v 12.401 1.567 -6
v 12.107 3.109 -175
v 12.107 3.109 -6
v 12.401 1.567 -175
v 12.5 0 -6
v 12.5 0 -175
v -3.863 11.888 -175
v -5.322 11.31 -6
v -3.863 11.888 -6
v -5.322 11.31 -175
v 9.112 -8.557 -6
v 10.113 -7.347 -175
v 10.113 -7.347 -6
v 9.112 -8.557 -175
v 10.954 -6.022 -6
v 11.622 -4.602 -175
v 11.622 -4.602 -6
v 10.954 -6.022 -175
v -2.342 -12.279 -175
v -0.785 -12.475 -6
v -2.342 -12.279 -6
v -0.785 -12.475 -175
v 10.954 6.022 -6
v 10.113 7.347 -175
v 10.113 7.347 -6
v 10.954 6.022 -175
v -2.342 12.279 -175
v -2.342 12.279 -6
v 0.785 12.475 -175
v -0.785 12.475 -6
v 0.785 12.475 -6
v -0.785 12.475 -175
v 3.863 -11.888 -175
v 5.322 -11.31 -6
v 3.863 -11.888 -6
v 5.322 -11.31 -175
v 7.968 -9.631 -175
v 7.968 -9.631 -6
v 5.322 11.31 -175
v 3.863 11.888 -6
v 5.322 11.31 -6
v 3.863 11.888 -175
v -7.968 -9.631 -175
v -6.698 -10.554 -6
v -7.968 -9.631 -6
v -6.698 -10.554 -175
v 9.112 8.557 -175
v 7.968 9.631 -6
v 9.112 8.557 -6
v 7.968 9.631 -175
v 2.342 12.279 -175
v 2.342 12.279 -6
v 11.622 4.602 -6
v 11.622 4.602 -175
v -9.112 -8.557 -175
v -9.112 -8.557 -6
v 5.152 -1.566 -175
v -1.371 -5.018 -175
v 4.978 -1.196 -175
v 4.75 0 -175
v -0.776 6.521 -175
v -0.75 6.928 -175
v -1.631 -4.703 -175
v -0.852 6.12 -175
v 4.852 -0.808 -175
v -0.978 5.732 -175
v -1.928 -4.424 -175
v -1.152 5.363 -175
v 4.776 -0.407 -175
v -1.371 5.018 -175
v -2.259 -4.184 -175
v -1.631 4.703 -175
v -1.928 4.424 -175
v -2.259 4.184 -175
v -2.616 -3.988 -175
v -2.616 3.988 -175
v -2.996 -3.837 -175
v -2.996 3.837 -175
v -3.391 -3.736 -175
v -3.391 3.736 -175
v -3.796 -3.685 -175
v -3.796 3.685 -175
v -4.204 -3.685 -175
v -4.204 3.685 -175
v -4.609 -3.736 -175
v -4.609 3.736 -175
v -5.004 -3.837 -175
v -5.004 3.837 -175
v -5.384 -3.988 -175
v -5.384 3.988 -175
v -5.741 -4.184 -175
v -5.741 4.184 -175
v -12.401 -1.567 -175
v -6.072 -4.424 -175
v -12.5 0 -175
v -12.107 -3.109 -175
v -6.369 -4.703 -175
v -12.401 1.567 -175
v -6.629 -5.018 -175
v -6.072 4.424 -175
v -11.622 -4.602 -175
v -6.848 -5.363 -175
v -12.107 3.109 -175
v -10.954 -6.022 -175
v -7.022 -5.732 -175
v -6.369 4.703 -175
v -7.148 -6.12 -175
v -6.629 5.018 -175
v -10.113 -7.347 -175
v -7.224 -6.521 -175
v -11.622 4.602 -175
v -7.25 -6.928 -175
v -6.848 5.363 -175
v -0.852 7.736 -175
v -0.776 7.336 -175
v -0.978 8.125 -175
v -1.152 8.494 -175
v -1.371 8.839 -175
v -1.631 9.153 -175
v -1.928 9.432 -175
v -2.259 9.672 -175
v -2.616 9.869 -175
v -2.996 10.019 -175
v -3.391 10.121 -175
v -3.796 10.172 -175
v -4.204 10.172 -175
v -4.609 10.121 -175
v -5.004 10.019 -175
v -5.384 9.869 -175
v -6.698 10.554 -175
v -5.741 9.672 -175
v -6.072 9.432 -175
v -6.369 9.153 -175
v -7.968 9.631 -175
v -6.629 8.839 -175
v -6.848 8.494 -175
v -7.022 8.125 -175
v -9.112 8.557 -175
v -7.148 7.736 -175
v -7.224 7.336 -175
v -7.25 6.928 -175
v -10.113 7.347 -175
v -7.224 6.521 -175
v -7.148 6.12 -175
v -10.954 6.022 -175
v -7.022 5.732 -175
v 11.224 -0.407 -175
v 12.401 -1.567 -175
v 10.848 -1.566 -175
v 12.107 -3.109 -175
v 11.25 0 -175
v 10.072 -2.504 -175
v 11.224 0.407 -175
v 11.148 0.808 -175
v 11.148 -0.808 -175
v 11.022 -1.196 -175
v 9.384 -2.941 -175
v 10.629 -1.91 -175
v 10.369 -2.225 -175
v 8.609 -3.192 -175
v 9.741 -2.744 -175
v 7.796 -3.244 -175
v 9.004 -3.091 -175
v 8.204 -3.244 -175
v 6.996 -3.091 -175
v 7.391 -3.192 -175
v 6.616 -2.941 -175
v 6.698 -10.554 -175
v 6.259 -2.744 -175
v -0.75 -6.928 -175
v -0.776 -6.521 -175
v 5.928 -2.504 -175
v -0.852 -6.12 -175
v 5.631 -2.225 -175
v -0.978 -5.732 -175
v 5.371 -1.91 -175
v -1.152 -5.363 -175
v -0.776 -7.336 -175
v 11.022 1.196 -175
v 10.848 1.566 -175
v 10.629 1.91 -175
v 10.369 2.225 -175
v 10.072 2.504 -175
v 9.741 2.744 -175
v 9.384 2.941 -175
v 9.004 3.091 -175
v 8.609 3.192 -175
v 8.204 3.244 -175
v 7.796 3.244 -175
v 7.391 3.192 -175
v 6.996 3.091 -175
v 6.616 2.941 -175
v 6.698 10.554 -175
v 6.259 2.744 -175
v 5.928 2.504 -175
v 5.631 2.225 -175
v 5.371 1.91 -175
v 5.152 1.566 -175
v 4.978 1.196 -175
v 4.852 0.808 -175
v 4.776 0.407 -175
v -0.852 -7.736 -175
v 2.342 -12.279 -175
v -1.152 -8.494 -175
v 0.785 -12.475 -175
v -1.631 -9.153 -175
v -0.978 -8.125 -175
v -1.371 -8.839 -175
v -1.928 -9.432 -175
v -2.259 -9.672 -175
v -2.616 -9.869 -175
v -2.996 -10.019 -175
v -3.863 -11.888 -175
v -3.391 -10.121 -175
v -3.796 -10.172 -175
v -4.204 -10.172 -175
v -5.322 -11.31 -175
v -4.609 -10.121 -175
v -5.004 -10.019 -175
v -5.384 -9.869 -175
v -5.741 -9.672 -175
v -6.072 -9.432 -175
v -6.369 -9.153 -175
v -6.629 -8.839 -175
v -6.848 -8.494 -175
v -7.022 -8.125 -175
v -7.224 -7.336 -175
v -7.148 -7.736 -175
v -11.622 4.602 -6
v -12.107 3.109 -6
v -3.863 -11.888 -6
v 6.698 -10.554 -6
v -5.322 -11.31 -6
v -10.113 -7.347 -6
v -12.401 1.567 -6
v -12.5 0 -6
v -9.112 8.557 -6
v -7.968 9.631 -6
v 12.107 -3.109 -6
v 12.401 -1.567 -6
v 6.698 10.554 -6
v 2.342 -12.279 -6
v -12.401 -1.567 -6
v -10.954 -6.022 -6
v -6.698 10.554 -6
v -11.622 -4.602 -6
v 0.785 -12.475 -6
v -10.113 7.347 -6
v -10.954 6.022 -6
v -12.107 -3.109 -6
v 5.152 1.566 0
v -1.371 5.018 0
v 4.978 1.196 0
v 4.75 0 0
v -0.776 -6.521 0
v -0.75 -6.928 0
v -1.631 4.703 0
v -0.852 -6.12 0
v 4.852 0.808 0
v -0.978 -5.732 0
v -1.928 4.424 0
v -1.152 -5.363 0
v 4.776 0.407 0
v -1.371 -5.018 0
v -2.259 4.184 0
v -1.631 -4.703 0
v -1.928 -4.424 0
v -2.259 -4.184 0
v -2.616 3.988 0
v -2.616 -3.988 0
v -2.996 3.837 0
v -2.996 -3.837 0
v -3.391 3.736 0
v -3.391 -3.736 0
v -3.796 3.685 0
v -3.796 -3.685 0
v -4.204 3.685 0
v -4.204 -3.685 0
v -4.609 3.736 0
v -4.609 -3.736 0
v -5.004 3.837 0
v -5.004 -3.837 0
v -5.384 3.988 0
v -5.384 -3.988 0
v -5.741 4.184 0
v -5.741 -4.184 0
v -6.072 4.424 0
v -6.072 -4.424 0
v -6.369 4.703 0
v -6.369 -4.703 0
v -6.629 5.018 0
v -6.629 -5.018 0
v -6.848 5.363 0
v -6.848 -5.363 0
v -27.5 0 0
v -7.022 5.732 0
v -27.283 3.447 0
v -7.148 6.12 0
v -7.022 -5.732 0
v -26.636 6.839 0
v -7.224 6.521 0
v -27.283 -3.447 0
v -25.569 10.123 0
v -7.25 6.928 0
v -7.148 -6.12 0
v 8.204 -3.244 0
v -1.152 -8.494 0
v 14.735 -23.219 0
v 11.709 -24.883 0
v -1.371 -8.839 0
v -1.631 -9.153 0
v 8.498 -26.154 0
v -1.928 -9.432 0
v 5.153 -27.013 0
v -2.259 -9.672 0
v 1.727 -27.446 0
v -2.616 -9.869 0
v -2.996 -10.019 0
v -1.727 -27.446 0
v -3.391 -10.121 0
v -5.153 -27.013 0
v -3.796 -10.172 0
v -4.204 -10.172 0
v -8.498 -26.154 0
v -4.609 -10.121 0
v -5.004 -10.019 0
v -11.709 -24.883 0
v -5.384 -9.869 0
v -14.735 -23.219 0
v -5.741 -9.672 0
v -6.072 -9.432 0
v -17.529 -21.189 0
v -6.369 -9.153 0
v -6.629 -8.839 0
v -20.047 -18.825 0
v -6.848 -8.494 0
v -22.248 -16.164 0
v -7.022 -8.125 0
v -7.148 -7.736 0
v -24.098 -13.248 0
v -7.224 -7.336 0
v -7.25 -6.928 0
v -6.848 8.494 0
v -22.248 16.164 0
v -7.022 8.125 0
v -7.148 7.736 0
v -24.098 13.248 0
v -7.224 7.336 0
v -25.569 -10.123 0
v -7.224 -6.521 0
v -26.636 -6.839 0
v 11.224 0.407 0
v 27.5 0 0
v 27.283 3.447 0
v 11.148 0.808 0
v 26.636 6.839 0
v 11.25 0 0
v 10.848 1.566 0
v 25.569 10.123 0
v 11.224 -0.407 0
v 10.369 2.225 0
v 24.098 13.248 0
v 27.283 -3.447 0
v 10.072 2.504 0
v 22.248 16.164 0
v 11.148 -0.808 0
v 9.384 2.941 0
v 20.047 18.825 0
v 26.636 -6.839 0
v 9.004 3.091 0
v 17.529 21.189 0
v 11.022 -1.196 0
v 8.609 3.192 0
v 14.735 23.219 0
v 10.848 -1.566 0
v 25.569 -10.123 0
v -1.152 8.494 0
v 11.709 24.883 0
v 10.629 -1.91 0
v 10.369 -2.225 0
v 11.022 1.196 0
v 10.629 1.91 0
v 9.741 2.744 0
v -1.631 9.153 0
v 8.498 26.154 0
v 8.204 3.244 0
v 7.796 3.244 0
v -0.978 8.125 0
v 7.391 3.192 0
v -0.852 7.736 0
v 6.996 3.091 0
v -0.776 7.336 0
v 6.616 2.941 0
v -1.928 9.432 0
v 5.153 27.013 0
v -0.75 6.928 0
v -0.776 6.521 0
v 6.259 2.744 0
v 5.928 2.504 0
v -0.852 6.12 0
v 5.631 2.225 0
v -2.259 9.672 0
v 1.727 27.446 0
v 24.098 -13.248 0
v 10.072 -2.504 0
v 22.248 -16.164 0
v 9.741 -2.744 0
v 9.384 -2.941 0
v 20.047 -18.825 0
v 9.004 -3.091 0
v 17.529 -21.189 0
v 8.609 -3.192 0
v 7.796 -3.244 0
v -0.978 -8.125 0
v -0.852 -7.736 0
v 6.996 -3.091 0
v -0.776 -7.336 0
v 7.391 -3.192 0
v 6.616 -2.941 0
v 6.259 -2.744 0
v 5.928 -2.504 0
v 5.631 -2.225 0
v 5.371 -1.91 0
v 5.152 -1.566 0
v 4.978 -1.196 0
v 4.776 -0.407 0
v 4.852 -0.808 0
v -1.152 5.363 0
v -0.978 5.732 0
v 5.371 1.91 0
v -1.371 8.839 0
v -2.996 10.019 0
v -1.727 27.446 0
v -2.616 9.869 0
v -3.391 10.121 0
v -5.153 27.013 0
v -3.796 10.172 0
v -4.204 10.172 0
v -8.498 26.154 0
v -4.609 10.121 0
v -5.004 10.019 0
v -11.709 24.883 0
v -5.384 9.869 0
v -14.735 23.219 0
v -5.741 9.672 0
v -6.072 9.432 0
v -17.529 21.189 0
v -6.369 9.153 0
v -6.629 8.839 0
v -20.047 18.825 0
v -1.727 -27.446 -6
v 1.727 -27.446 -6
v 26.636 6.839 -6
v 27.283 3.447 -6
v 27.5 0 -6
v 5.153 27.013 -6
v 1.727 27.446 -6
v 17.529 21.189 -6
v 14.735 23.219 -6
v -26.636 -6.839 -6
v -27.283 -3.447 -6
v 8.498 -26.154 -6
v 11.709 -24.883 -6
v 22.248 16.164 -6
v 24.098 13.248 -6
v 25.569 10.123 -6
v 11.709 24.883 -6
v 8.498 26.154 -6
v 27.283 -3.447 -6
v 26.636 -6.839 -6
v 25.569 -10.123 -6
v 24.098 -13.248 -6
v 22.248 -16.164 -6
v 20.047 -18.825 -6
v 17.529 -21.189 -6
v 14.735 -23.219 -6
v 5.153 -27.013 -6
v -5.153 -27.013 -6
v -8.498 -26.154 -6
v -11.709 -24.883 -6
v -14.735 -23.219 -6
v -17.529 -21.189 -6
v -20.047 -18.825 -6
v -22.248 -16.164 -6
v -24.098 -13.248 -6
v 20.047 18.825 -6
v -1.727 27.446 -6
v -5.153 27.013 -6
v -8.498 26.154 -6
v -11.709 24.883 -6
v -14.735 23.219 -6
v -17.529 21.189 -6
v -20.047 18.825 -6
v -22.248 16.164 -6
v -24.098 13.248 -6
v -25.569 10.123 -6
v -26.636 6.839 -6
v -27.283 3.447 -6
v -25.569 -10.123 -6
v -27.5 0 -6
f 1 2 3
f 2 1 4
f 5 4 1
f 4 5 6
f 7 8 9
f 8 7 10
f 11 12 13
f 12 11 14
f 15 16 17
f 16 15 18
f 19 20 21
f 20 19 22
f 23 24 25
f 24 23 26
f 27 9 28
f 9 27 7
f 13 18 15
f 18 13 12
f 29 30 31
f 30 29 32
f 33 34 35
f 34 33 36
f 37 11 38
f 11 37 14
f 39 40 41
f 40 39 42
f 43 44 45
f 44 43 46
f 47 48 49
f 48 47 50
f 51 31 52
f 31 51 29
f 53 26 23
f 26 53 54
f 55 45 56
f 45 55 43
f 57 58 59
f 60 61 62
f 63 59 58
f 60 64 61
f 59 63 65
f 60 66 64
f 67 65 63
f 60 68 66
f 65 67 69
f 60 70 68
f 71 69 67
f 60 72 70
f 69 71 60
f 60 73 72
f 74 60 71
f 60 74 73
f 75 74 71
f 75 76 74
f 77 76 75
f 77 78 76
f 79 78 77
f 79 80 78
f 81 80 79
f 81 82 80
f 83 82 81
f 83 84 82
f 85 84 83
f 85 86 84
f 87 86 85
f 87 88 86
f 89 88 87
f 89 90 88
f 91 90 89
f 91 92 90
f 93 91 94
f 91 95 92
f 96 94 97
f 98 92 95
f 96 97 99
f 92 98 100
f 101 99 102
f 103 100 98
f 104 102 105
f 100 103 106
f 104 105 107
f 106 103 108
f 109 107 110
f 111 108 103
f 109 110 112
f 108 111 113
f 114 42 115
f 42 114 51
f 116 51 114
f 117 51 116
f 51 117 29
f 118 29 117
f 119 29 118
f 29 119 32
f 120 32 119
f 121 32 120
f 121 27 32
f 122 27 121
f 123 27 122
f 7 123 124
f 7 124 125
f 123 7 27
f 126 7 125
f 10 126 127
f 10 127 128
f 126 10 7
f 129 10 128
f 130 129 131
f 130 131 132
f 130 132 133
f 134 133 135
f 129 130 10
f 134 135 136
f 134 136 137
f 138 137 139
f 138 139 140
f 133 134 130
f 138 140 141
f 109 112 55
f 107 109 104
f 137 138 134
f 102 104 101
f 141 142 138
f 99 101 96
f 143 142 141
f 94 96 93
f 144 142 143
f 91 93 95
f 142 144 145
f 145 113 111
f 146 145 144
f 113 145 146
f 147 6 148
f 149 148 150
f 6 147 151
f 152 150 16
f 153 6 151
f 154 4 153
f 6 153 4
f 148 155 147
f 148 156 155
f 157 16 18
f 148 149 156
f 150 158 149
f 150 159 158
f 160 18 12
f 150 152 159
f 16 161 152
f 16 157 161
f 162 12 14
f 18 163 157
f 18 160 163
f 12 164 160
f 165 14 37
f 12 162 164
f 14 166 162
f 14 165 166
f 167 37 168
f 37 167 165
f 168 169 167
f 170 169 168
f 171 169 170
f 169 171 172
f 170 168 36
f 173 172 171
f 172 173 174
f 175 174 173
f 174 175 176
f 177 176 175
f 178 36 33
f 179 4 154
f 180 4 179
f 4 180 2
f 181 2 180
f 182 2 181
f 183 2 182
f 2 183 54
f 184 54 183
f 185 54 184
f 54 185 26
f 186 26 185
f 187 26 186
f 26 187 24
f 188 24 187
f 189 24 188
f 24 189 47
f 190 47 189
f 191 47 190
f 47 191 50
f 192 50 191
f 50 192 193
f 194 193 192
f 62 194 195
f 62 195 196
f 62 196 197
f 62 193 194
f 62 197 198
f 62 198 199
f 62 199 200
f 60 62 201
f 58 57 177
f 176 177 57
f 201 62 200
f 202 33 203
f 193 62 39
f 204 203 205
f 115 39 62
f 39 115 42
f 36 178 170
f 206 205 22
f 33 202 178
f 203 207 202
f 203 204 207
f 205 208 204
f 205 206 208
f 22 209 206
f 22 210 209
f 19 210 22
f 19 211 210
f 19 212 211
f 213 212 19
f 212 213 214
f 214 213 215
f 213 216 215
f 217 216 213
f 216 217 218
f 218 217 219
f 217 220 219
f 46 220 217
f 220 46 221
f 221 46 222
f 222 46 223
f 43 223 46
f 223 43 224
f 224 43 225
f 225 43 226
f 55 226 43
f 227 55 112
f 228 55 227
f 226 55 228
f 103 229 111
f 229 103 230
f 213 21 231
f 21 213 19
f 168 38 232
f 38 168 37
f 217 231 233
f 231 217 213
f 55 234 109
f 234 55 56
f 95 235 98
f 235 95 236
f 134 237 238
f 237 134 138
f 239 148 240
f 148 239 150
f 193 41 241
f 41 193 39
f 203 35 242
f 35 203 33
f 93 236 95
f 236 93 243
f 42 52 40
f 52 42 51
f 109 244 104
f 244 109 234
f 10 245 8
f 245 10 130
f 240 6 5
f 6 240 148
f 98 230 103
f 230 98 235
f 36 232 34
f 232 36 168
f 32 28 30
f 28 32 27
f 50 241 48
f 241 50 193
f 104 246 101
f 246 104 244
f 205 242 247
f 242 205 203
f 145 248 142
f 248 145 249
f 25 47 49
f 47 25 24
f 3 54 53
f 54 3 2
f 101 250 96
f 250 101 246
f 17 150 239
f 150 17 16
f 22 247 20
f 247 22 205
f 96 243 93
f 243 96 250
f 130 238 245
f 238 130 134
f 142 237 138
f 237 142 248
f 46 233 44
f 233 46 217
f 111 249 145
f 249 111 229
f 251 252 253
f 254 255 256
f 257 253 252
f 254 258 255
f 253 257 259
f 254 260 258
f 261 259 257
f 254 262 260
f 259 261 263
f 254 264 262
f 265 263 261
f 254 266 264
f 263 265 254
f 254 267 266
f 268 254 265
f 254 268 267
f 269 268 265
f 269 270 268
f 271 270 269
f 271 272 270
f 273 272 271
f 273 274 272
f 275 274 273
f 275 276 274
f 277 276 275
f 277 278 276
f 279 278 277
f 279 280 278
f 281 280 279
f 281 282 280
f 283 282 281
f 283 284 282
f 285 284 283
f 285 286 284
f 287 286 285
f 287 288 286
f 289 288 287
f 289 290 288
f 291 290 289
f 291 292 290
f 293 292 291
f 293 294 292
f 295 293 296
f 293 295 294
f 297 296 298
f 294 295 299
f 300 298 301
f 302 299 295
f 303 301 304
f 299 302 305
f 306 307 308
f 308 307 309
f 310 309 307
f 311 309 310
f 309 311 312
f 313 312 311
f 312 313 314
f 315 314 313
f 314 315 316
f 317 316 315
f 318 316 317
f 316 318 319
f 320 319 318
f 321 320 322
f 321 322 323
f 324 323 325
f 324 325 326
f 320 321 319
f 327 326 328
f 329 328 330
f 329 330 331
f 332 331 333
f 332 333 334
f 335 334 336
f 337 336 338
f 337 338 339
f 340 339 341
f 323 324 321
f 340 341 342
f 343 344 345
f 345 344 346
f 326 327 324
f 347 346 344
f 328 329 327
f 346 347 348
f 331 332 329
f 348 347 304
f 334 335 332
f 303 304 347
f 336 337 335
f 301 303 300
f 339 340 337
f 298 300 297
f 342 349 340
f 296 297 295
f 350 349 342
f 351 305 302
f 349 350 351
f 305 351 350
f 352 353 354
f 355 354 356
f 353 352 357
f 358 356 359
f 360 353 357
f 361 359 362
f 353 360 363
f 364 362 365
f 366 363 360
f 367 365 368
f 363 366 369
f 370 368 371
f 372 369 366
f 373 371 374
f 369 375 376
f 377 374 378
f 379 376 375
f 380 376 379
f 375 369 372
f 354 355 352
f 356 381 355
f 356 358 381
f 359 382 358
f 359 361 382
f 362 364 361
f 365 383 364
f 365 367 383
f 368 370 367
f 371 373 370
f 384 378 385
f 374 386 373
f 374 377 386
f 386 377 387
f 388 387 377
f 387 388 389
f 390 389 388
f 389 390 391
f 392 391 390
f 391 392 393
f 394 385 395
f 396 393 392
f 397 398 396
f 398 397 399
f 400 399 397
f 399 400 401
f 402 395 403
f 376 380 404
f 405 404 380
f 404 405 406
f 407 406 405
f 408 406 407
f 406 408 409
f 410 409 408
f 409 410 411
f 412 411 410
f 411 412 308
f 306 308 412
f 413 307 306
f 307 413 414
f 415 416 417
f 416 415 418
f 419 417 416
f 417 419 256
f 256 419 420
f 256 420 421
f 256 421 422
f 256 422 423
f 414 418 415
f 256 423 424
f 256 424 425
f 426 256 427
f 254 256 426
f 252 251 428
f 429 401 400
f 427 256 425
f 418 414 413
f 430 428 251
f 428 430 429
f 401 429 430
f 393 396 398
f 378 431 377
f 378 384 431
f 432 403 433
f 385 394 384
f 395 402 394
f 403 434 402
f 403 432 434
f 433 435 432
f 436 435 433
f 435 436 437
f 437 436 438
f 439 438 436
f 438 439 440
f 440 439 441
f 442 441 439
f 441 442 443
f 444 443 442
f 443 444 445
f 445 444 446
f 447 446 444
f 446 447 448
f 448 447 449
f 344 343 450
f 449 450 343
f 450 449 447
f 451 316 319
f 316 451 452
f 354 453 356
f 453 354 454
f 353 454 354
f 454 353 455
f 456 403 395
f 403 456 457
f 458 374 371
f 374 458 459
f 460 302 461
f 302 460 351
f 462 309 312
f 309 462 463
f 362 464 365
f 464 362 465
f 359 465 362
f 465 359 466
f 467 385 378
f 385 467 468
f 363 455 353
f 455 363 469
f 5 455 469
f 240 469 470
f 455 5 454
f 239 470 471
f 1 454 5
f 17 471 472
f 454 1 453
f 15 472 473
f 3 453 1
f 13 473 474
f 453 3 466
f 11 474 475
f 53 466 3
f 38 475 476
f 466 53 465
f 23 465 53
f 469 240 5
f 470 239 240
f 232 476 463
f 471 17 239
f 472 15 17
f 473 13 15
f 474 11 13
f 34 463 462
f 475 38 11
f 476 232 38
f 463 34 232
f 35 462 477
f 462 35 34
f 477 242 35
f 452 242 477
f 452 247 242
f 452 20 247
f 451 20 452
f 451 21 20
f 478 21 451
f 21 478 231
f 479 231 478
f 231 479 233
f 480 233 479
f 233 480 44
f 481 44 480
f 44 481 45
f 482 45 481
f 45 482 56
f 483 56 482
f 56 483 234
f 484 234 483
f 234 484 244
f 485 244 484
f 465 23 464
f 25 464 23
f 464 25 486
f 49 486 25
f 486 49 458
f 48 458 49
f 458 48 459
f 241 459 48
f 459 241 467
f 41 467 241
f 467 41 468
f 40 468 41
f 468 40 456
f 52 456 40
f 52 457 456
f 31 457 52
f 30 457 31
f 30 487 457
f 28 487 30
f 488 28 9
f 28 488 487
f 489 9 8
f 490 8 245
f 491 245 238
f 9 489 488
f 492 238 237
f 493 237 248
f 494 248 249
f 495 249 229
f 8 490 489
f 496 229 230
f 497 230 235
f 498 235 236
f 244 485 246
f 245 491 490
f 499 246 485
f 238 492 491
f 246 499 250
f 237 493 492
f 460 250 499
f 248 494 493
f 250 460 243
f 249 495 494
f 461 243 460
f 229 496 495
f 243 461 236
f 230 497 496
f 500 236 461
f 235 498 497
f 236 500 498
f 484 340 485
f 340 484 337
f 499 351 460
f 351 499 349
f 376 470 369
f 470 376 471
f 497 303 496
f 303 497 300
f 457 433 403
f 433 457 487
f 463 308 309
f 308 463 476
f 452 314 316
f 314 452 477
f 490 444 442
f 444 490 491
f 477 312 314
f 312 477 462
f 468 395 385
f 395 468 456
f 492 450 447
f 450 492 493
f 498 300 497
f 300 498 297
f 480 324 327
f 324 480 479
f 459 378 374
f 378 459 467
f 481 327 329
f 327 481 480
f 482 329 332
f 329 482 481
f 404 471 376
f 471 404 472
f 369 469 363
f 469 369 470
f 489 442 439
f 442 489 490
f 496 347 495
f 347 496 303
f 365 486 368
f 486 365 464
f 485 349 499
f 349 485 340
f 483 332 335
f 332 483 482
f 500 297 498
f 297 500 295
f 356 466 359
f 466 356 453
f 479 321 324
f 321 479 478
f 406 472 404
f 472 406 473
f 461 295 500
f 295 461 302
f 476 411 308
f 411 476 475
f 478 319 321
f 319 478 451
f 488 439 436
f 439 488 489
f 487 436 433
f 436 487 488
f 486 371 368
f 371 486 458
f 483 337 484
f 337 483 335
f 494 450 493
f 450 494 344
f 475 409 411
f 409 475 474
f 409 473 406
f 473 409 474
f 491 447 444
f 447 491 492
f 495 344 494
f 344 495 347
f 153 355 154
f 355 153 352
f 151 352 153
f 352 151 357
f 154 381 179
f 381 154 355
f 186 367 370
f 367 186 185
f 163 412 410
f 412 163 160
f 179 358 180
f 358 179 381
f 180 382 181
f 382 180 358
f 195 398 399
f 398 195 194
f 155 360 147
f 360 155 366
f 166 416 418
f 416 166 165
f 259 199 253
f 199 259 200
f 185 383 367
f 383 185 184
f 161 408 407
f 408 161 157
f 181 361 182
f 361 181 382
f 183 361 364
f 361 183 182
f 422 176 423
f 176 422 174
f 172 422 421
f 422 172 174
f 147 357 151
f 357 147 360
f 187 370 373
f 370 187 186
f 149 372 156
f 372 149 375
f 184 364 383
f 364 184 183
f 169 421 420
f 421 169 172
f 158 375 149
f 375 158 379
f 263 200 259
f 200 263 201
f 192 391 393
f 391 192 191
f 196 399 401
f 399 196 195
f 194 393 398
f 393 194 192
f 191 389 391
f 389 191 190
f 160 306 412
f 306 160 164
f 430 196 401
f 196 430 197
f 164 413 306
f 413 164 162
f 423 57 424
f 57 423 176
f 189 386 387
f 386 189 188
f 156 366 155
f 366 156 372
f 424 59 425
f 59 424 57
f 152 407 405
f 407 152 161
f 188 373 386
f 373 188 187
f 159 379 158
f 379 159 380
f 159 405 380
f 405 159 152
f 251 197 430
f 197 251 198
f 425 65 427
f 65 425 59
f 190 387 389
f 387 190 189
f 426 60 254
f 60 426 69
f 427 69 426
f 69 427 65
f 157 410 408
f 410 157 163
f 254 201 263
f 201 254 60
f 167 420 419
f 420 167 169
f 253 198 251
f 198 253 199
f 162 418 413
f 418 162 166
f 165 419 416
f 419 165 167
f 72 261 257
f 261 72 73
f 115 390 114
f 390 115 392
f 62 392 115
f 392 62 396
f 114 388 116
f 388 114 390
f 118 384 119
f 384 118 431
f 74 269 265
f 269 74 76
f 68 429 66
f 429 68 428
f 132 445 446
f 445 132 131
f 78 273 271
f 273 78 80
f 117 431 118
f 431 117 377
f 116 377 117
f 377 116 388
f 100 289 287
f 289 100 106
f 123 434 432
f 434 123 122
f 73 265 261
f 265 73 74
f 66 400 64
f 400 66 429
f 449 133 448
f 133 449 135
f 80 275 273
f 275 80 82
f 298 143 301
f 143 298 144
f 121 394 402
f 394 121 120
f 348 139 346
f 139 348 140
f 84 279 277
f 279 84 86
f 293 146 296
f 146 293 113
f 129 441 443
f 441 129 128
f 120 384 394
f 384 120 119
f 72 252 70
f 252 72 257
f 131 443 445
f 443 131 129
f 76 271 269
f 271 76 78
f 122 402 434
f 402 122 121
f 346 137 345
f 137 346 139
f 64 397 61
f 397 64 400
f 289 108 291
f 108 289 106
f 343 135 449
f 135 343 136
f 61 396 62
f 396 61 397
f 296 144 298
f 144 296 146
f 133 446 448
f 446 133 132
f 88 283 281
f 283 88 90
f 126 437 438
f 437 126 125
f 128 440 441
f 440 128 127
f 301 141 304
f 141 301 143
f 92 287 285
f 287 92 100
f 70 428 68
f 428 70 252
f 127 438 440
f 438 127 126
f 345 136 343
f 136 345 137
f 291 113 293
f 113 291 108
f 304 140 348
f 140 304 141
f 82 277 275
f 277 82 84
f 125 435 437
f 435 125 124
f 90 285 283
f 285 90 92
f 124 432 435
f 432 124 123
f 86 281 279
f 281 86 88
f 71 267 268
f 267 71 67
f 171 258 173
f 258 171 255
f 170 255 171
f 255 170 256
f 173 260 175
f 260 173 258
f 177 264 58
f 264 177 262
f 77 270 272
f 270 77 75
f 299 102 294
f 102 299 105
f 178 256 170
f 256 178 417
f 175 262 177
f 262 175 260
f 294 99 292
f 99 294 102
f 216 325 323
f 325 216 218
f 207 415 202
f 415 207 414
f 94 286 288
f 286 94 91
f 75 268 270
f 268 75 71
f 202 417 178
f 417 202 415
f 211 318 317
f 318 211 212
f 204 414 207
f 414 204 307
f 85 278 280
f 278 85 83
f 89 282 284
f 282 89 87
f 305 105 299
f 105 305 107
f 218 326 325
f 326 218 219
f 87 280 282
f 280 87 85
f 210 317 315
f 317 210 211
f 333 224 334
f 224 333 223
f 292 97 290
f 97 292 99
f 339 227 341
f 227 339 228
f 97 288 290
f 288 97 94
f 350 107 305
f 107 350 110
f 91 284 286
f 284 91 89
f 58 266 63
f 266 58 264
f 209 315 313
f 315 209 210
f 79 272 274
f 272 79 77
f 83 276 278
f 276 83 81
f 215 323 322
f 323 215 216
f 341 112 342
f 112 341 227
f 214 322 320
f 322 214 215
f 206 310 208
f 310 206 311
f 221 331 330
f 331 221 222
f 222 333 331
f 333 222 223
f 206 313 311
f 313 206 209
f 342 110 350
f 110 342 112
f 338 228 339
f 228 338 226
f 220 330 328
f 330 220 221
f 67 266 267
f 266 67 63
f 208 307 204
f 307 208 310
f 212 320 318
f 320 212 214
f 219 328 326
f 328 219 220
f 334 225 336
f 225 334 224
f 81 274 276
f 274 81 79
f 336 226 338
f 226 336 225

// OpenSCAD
$fn = 50;


difference() {
	union() {
		translate(v = [0, 0, -175.0000000000]) {
			cylinder(h = 175, r = 12.5000000000);
		}
		translate(v = [0, 0, -6.0000000000]) {
			cylinder(h = 6, r = 27.5000000000);
		}
	}
	union() {
		#translate(v = [8.0000000000, 0.0000000000, -175]) {
			cylinder(h = 175, r = 3.2500000000);
		}
		#translate(v = [-4.0000000000, 6.9282032303, -175]) {
			cylinder(h = 175, r = 3.2500000000);
		}
		#translate(v = [-4.0000000000, -6.9282032303, -175]) {
			cylinder(h = 175, r = 3.2500000000);
		}
	}
}
